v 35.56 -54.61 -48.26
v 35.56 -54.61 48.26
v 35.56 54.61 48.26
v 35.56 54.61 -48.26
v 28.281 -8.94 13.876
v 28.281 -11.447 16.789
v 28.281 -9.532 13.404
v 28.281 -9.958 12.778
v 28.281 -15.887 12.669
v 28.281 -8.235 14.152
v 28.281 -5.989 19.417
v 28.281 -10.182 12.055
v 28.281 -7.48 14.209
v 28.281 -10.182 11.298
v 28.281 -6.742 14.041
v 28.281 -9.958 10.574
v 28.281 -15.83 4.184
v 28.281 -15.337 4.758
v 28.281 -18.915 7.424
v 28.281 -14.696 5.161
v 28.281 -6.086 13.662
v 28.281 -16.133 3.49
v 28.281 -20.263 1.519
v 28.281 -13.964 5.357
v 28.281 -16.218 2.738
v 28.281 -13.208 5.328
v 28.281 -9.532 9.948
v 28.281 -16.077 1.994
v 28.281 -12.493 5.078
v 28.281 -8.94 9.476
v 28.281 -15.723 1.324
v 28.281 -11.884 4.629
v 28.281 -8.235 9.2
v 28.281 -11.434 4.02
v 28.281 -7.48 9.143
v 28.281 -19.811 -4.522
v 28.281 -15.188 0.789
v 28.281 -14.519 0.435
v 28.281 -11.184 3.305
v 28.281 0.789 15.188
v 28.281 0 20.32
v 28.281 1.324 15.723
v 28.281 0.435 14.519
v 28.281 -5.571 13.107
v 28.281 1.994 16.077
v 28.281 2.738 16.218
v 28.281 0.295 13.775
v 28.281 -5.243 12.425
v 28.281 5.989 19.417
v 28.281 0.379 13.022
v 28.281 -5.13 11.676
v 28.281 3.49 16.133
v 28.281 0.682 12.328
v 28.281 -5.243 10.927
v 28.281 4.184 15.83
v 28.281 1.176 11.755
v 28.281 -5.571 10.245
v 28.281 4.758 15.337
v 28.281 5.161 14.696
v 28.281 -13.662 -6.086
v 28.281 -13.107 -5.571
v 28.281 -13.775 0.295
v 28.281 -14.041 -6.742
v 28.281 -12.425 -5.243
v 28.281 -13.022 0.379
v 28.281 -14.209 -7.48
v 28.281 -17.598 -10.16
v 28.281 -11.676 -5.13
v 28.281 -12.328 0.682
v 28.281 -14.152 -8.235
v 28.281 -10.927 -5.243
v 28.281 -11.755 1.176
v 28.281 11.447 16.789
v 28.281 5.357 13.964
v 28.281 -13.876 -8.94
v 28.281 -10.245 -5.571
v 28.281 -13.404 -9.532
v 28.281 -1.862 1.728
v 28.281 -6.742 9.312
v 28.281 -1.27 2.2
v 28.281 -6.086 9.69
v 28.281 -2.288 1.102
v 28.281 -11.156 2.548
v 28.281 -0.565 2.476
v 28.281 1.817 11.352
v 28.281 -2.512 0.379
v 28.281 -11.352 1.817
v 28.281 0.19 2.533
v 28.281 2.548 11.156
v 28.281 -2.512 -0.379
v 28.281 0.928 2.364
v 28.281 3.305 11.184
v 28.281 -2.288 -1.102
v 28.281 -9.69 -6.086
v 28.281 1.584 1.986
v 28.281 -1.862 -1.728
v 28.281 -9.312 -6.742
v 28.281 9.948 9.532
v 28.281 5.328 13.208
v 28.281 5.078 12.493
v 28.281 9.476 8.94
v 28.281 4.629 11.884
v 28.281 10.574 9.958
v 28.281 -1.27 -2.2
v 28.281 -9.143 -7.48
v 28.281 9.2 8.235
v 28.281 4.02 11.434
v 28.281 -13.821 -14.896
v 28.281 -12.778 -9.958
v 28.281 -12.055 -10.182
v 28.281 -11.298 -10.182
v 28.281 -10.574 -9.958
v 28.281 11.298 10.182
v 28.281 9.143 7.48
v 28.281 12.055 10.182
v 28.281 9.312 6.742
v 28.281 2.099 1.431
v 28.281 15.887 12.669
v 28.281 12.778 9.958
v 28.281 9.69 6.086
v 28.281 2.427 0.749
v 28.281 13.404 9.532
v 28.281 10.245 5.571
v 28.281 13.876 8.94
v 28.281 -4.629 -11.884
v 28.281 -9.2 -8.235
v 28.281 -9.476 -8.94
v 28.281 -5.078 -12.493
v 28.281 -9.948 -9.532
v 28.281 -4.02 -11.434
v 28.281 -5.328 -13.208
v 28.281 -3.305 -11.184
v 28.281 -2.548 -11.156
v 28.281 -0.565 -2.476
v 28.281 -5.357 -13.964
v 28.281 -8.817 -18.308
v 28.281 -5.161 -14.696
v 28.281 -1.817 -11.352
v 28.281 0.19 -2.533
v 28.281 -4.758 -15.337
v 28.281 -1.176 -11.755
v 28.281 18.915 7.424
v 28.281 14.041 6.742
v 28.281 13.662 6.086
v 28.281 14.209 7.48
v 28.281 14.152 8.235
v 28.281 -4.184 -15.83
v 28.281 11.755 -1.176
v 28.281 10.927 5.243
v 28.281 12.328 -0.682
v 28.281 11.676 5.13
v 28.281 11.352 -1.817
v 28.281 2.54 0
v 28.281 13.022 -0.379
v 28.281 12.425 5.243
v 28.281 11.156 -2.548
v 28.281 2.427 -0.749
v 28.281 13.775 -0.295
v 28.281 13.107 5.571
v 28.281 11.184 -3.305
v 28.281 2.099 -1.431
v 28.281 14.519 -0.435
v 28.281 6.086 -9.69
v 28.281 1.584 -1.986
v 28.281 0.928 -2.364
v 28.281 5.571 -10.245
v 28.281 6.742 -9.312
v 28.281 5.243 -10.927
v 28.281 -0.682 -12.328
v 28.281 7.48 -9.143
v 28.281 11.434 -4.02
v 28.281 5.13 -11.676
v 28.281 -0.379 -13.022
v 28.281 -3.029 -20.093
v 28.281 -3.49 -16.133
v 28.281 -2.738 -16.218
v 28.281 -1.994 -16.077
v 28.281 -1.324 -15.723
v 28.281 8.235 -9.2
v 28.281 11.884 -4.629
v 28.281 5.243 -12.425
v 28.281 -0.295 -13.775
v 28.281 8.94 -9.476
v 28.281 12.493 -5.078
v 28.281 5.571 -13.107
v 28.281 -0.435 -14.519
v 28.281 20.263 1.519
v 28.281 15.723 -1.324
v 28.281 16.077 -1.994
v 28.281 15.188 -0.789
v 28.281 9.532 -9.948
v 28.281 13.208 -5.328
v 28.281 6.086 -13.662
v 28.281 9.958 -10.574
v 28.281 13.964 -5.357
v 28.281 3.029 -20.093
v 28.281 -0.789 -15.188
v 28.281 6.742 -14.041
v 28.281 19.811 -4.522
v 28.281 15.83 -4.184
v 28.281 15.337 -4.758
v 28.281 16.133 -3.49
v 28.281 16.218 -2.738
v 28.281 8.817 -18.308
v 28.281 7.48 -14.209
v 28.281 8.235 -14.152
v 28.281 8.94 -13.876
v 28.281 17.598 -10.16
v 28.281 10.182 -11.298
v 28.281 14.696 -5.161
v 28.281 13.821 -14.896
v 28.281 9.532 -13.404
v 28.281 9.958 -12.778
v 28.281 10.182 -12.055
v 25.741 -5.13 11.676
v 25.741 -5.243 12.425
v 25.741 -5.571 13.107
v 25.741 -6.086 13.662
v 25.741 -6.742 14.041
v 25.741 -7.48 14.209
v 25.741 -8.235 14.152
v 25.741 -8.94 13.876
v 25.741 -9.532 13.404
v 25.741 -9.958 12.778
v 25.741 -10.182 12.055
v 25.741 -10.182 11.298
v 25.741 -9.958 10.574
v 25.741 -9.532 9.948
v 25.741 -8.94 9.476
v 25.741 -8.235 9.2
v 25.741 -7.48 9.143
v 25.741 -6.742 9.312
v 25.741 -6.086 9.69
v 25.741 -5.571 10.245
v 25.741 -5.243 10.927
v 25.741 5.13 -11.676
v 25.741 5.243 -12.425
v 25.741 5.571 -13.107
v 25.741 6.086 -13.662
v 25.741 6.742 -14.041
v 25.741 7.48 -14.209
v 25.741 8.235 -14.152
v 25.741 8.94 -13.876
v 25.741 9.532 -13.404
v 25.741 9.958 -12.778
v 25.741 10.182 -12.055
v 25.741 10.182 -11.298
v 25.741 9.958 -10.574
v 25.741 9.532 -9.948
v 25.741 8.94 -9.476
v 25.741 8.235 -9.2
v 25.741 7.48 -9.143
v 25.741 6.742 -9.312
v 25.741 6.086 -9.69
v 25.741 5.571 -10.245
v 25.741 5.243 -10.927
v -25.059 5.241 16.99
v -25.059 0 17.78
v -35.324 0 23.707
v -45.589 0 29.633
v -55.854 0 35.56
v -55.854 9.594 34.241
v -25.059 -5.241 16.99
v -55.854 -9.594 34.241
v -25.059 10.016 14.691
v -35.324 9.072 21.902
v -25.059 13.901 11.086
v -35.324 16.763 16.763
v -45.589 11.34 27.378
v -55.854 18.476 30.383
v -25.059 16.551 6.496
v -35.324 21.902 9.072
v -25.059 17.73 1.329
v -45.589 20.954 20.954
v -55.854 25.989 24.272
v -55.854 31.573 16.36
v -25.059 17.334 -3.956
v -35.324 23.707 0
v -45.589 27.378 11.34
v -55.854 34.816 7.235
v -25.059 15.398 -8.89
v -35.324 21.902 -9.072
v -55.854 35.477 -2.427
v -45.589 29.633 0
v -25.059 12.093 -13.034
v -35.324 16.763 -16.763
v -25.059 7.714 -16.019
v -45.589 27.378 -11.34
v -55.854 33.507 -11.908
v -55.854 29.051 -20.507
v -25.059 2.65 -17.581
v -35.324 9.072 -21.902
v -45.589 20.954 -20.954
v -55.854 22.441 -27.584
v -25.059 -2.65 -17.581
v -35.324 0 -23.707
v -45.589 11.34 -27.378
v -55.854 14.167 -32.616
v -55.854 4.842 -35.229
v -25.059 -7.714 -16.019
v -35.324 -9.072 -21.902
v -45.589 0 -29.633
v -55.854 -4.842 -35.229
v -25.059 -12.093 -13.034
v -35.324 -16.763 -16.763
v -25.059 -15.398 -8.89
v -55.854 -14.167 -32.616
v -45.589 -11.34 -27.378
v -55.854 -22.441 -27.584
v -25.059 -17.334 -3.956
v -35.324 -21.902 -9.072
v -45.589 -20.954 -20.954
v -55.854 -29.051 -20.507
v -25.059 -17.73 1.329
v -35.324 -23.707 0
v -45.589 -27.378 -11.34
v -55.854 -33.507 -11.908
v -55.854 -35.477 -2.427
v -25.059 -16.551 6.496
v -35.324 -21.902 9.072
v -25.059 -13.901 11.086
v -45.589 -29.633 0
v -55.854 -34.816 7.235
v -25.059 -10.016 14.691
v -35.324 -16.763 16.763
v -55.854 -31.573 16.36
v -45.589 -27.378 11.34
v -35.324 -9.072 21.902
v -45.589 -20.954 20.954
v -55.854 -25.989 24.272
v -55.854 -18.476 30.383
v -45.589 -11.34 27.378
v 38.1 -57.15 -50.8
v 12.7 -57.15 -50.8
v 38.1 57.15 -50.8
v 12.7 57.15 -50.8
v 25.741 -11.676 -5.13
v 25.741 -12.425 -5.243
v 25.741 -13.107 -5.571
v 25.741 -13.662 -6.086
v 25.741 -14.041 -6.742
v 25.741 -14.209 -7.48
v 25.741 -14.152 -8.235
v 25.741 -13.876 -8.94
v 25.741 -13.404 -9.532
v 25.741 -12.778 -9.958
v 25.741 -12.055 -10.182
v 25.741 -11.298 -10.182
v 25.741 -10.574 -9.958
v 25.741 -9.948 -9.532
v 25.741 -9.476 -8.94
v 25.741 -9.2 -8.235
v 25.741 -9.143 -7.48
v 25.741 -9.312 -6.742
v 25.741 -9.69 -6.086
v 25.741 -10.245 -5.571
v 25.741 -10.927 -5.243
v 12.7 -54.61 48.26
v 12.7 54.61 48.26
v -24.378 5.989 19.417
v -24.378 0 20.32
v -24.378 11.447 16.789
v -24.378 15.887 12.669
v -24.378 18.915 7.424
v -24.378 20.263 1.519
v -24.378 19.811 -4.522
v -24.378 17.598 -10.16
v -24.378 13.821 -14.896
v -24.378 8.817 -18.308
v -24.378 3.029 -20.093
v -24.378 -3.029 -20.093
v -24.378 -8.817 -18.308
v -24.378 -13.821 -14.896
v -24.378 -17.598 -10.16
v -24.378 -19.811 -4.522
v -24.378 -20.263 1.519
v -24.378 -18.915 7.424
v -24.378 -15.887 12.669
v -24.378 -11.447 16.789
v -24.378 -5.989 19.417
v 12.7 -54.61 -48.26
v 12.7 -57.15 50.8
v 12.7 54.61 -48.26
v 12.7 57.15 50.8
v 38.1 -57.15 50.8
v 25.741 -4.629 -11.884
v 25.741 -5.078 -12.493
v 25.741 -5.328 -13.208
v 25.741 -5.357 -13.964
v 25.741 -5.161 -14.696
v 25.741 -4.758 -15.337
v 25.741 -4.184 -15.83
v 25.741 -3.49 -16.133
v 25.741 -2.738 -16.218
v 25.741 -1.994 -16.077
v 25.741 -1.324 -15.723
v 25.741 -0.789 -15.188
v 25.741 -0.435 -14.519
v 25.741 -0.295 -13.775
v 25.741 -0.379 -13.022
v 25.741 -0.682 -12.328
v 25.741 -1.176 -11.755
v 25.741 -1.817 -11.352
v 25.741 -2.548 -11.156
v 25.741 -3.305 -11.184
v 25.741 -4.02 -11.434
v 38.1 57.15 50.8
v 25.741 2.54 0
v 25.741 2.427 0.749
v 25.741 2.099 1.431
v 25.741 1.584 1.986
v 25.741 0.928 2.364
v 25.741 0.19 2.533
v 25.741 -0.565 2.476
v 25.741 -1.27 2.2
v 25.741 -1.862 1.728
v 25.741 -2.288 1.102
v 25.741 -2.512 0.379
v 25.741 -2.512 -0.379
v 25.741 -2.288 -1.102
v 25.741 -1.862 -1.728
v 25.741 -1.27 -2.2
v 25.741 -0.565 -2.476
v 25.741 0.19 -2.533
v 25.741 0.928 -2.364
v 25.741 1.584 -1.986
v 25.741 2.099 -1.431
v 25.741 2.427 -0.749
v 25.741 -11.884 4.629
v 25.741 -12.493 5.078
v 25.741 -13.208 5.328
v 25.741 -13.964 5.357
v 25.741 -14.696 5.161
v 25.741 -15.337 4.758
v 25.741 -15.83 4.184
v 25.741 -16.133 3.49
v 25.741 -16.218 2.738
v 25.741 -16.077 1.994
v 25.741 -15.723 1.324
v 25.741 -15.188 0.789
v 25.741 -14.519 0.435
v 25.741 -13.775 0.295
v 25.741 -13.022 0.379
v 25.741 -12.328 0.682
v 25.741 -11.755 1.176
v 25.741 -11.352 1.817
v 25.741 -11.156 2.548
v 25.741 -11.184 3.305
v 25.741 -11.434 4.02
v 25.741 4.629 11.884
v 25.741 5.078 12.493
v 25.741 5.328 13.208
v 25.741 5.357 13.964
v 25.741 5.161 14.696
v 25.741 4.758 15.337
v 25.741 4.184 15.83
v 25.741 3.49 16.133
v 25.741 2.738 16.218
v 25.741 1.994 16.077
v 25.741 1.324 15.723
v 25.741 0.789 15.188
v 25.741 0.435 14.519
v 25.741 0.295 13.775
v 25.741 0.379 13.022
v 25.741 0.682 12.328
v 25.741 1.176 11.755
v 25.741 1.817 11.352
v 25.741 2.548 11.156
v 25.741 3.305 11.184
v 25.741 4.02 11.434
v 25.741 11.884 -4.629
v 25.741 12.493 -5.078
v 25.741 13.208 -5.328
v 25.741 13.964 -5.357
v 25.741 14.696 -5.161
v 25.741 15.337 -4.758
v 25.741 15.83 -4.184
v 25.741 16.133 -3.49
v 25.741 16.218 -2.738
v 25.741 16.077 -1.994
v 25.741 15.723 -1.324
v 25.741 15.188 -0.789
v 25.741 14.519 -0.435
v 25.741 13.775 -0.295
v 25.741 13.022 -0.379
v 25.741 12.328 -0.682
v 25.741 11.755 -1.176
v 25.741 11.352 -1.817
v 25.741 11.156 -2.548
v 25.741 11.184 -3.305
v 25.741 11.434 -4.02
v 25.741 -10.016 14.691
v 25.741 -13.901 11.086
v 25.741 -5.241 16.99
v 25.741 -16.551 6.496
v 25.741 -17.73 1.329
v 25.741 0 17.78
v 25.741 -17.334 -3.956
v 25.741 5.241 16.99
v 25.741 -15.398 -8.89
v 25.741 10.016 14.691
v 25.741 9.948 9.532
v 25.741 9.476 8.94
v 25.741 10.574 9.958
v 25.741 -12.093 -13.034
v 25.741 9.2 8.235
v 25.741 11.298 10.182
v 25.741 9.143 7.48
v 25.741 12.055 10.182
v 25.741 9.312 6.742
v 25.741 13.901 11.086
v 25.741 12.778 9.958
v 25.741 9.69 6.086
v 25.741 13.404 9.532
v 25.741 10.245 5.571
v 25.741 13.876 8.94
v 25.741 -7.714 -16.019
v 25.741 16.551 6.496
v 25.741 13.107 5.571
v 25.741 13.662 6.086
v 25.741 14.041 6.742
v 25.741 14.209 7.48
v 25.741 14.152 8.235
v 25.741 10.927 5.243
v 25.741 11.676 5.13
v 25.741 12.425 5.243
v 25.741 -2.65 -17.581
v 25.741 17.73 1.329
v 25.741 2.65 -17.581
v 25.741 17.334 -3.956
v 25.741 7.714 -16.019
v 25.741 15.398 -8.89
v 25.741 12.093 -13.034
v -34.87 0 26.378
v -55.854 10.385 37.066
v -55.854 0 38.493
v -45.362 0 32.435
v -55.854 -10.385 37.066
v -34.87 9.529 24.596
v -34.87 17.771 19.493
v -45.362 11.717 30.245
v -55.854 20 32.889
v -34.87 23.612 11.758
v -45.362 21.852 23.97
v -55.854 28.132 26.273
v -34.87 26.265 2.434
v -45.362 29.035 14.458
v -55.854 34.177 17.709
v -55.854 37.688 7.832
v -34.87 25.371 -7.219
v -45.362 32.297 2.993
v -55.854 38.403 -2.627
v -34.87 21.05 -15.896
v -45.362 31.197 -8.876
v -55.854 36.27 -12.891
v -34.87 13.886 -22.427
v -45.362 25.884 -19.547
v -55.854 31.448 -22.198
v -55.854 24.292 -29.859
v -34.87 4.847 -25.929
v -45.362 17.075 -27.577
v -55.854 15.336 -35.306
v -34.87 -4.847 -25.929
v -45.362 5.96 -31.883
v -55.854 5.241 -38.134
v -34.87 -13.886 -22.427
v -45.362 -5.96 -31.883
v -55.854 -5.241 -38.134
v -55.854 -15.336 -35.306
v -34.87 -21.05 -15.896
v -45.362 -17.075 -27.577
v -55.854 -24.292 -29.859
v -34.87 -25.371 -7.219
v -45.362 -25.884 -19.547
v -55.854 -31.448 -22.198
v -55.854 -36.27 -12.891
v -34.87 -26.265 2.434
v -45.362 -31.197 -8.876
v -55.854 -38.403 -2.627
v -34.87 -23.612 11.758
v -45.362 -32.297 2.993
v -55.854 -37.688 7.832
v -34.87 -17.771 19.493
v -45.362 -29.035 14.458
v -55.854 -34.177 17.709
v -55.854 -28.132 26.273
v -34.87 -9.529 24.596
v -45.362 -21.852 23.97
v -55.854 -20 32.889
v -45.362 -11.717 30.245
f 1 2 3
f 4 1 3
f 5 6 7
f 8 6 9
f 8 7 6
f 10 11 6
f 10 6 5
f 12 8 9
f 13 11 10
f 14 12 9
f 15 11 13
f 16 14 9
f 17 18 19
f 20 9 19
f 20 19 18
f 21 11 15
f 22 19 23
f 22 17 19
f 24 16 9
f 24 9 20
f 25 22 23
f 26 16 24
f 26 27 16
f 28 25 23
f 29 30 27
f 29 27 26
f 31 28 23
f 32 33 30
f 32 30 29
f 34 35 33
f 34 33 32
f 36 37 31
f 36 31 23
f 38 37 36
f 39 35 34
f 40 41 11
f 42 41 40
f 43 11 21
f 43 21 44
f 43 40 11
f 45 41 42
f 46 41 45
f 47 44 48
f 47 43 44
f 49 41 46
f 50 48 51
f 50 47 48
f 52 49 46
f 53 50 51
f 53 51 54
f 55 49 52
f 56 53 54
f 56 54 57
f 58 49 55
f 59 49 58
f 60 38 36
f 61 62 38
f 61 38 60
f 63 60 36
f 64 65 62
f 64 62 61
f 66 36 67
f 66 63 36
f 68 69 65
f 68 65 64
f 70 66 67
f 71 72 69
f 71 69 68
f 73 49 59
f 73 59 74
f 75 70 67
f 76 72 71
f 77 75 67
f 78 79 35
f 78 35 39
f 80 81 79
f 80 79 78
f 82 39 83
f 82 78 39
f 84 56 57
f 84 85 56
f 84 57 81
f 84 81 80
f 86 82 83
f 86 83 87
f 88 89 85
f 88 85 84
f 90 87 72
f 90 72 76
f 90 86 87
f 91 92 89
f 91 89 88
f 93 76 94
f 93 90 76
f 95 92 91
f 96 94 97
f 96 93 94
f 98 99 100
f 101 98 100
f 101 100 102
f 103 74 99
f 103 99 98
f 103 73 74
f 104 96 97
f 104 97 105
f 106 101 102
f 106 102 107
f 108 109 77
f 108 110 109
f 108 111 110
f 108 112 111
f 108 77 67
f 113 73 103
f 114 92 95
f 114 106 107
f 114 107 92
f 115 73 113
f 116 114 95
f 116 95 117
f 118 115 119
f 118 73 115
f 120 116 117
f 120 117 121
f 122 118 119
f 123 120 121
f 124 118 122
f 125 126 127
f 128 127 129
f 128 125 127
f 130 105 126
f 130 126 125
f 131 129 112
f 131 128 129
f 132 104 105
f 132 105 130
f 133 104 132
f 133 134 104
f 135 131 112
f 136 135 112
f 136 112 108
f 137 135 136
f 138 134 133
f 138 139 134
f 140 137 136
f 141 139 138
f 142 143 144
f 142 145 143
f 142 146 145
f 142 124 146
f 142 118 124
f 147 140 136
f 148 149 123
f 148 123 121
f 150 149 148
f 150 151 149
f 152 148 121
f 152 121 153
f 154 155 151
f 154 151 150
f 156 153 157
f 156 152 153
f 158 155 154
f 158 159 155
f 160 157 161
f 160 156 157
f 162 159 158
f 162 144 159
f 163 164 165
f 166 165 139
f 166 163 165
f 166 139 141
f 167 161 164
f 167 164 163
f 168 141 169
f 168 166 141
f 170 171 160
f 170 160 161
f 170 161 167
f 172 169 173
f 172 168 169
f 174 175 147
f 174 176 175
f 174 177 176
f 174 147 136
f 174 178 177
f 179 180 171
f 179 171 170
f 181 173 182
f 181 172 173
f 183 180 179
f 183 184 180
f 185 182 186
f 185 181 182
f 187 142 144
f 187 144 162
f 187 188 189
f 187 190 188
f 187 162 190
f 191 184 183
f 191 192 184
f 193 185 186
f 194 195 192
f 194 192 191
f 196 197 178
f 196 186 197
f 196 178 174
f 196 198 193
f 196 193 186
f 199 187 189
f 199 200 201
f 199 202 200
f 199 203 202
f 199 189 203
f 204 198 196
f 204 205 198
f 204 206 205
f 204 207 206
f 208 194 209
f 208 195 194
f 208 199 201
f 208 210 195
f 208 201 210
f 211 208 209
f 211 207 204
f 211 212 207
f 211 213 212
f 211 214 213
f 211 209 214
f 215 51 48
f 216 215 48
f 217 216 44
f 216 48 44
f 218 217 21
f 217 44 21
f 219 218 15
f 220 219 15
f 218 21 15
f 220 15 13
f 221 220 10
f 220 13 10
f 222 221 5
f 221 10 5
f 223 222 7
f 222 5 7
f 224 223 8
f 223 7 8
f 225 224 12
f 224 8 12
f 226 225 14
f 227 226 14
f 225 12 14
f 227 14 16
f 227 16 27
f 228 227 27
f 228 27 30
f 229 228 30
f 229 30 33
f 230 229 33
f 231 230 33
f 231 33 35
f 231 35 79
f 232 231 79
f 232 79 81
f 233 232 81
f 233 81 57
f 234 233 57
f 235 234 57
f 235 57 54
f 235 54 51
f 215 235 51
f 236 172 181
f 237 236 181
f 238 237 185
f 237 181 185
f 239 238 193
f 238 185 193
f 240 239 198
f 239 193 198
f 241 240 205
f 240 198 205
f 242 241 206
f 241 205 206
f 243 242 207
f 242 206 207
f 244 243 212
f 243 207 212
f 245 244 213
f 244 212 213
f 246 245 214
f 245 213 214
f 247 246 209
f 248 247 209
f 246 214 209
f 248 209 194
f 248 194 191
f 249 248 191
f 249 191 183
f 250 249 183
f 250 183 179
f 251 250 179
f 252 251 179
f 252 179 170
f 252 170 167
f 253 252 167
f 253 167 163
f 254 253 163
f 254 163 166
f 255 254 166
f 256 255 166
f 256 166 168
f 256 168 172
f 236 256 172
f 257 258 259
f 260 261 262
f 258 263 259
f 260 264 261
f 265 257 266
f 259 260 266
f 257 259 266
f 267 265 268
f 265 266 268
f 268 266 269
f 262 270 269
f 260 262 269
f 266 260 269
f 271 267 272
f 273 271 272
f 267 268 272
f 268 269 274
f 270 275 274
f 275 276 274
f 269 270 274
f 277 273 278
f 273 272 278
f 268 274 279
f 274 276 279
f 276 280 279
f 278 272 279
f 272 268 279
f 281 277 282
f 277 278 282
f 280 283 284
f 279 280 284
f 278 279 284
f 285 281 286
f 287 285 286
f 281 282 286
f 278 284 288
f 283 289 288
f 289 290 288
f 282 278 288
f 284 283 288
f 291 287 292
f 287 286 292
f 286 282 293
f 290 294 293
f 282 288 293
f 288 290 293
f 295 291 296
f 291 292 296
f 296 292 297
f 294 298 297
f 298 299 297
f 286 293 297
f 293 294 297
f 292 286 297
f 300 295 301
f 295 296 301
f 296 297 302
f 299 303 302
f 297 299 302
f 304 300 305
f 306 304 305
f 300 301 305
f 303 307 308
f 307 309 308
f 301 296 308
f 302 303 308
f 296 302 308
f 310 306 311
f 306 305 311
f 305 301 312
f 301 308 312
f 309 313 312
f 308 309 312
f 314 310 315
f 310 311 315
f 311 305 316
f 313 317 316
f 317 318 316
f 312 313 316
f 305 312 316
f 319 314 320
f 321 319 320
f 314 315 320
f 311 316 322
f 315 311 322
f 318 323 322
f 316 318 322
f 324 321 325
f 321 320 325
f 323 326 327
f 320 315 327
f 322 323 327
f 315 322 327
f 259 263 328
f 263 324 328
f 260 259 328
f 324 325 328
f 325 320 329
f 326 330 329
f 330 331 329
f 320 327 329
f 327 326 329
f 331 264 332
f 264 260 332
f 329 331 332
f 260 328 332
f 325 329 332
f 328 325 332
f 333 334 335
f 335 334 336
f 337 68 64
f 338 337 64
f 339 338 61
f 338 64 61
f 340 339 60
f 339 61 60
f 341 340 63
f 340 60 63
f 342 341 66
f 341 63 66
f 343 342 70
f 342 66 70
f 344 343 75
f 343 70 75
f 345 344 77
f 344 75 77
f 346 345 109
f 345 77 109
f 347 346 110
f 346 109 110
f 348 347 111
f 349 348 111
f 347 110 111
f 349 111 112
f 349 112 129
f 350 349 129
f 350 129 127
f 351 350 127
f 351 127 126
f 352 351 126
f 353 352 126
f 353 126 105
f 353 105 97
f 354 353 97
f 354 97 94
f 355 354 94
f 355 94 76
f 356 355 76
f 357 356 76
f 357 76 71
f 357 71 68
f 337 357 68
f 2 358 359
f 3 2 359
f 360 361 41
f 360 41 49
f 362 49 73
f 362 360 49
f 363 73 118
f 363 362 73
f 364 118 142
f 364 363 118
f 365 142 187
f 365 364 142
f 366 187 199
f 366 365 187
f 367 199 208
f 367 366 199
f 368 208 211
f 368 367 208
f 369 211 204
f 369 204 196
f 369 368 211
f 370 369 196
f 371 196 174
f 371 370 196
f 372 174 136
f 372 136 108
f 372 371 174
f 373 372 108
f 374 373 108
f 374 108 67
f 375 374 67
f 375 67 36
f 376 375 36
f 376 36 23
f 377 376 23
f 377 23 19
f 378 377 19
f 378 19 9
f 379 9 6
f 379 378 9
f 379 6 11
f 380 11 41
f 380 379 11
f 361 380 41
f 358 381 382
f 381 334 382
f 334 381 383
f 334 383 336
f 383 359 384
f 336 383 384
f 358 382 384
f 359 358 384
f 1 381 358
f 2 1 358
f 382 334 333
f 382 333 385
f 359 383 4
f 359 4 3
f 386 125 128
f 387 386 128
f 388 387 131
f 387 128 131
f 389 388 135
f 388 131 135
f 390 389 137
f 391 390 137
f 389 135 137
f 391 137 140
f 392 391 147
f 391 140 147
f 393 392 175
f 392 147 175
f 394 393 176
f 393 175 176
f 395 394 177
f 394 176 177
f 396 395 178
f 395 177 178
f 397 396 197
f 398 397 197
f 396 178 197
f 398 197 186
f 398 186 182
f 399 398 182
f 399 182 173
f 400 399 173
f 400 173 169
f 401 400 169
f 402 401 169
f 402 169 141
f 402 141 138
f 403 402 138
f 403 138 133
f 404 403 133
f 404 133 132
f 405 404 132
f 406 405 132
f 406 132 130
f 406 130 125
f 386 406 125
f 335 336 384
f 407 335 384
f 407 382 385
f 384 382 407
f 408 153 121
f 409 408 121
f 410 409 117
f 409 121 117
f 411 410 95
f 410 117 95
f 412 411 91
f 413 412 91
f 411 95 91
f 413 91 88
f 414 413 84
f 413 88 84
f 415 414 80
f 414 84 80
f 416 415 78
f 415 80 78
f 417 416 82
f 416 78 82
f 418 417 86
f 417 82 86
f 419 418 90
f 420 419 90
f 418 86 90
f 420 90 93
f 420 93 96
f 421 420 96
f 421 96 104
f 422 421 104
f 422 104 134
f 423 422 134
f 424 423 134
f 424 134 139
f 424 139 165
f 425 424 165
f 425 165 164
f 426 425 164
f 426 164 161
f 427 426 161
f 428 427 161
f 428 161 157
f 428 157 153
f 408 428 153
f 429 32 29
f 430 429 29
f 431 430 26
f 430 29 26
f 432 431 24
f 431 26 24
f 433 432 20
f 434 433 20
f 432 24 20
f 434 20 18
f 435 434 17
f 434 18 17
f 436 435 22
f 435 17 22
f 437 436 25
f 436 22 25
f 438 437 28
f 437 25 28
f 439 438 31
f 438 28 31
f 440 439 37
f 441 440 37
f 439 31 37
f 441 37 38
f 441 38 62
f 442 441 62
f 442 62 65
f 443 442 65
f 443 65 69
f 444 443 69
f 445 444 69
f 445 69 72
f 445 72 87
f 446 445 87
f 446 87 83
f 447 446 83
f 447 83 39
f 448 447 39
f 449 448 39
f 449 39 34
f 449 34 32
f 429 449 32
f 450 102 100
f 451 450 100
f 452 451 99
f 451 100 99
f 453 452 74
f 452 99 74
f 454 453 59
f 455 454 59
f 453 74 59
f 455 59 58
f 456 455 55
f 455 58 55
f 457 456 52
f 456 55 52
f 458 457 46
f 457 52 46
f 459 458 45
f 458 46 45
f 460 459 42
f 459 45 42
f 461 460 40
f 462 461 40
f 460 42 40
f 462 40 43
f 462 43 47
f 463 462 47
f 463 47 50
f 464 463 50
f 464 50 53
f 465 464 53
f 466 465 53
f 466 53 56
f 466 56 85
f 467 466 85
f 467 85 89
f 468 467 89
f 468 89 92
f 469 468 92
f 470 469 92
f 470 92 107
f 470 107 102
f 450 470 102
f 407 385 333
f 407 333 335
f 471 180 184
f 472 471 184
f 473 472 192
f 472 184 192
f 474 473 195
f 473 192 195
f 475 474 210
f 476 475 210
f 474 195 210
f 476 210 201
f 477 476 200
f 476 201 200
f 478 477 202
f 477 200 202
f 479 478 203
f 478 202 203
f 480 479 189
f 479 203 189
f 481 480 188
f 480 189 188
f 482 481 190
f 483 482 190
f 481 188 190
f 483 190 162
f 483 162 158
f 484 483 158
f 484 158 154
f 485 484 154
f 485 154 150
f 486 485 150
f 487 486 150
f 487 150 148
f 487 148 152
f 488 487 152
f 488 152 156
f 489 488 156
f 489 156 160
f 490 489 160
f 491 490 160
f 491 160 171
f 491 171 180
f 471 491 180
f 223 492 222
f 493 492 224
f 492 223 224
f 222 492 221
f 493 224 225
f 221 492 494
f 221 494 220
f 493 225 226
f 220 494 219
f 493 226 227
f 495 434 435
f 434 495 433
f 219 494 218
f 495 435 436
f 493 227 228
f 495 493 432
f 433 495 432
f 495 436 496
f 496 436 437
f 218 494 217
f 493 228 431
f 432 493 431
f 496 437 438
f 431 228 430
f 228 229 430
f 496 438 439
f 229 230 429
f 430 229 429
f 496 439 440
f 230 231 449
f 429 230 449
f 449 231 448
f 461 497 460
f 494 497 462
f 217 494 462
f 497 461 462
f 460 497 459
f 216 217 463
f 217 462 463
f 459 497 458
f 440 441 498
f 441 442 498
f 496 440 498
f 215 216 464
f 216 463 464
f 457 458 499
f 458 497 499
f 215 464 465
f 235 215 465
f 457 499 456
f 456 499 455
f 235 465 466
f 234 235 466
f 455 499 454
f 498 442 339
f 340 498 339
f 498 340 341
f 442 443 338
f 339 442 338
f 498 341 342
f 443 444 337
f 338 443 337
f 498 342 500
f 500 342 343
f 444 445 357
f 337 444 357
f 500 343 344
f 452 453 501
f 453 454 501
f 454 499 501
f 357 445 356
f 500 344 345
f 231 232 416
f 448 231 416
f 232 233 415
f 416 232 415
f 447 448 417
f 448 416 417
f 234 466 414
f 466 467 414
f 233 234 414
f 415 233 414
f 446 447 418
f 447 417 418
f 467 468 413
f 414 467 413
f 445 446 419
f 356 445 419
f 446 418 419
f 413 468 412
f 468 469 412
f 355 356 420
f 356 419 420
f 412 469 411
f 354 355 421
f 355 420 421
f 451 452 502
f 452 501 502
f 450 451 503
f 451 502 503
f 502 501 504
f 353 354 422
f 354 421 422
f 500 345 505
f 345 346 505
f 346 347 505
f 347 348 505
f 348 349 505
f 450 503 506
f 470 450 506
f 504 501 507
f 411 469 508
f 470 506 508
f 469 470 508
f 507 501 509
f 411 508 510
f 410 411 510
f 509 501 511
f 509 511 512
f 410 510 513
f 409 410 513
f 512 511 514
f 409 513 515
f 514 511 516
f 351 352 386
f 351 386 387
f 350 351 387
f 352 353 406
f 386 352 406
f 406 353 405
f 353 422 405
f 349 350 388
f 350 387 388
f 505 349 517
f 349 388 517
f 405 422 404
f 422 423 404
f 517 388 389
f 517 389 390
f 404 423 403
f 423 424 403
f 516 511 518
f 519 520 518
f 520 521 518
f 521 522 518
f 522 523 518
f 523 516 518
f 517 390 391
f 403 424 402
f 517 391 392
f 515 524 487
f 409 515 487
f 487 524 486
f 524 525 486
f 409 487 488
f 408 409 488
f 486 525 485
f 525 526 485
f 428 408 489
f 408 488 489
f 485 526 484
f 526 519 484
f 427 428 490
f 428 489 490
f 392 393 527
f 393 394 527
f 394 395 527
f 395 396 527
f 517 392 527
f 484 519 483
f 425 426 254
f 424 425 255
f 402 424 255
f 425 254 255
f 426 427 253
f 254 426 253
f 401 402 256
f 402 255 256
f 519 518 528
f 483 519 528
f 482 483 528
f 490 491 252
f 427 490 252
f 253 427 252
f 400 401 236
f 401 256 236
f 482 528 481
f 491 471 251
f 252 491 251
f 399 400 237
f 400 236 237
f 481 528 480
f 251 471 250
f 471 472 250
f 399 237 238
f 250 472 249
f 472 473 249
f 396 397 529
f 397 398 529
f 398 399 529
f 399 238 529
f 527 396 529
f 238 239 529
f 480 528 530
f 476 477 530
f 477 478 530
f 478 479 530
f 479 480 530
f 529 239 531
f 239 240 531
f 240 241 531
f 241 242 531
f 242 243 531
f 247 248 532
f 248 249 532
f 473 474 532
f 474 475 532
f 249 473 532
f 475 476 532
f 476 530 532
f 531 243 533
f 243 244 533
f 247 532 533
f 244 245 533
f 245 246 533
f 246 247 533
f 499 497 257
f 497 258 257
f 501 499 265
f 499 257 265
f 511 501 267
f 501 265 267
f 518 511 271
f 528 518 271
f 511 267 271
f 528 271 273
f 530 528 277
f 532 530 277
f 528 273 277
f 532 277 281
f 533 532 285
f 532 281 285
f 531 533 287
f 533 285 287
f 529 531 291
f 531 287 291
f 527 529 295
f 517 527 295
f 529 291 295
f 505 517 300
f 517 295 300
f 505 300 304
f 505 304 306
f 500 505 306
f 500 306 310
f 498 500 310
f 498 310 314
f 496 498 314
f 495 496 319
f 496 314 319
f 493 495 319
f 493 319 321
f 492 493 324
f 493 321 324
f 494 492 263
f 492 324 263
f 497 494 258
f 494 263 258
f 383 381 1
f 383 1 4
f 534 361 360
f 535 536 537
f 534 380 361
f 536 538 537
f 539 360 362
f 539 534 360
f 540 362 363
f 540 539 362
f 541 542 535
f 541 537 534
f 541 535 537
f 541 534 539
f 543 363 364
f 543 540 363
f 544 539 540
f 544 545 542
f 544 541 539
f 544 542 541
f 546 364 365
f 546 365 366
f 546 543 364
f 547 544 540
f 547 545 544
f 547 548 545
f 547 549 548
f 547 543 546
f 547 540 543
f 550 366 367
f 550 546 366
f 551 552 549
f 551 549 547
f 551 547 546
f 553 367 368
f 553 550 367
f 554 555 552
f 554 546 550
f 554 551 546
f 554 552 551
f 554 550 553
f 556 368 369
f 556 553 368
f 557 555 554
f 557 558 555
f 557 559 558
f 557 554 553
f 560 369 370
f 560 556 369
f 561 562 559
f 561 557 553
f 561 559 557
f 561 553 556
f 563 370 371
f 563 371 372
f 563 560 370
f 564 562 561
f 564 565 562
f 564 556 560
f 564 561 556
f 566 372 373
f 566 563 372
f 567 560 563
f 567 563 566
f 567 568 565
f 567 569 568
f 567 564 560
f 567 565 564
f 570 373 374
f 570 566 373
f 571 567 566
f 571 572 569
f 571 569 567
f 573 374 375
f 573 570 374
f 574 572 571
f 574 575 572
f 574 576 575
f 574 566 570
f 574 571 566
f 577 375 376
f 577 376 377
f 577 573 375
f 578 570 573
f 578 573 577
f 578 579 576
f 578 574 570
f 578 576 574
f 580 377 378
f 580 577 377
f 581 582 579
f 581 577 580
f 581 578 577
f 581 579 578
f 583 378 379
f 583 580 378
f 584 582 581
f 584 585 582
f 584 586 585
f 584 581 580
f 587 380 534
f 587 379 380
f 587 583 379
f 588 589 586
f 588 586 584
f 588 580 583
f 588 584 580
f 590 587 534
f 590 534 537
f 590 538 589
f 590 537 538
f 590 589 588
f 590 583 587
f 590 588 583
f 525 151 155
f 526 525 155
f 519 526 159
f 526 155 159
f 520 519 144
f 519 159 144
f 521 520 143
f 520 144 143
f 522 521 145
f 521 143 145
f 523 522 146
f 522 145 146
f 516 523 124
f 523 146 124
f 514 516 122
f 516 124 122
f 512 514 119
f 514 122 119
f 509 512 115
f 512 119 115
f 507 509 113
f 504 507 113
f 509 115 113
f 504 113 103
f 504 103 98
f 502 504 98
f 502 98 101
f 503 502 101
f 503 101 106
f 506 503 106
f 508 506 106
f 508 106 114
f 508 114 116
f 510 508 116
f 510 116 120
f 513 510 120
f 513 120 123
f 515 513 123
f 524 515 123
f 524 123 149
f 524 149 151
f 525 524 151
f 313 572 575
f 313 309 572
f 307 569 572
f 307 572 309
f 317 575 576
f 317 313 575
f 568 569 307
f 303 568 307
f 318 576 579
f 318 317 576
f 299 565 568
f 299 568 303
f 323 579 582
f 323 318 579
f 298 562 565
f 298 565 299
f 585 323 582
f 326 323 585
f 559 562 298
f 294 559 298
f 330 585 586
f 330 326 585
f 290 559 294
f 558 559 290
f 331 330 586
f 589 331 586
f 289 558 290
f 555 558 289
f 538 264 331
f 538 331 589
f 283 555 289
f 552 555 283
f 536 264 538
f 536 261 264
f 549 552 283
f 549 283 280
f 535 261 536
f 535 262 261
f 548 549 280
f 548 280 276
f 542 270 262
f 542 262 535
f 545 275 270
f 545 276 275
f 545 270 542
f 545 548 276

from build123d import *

# Parameters (mm, degrees)
F2_T            = 2.54
F3_R            = 2.54
F4_DEPTH        = 25.4
F4_COPIES_COUNT = 8
F5_R            = 2.54
F6_DEPTH        = 25.4
F8_W            = 114.3
F8_H            = 101.6
F9_DEPTH        = 25.4
F10_T           = -2.54


# Not quite as in the source:
# - a pattern or mirror of a feature is missing from the dataset's text; its kind, count and spacing are read off the source's solid


with BuildPart() as f1:
    # F0 (on Front) → F1 (revolve)
    with BuildSketch(Plane.XZ):
        Polygon((-25.0586248056, 17.78), (-55.8544881642, 35.56), (-55.8544881642, 0), (25.7413751944, 0), (25.7413751944, 17.78), align=None)
    revolve(axis=Axis((-15.0565564849, 0, 0), (-1, 0, 0)))

    # F2
    f2_openings = [f1.faces().sort_by_distance(p)[0] for p in [
        (-55.854488, 0, 0),
    ]]
    offset(amount=F2_T, openings=f2_openings, kind=Kind.INTERSECTION)

    # F3 (on face) → F4 (cut)
    with BuildSketch(Plane.YZ.offset(28.2813751944)):
        with Locations((-7.6700180371, 11.6761176472)):
            Circle(F3_R)
    f4 = extrude(amount=-F4_DEPTH, mode=Mode.SUBTRACT)

    # F4_copies: F4 ×8 about axis
    f4_copies_axis = Axis((0, 0, 0), (1, 0, 0))
    for i in range(1, F4_COPIES_COUNT):
        add(f4.rotate(f4_copies_axis, i * 360 / F4_COPIES_COUNT), mode=Mode.SUBTRACT)

    # F5 (on face) → F6 (cut)
    with BuildSketch(Plane.YZ.offset(28.2813751944)):
        Circle(F5_R)
    extrude(amount=-F6_DEPTH, mode=Mode.SUBTRACT)


with BuildPart() as f9:
    # F8 (on offset) → F9 (new body)
    with BuildSketch(Plane.YZ.offset(12.7)):
        Rectangle(F8_W, F8_H)
    extrude(amount=F9_DEPTH)

    # F10
    f10_openings = [f9.faces().sort_by_distance(p)[0] for p in [
        (12.7, 0, 0),
    ]]
    offset(amount=F10_T, openings=f10_openings)


solid = Compound([f1.part, f9.part])
